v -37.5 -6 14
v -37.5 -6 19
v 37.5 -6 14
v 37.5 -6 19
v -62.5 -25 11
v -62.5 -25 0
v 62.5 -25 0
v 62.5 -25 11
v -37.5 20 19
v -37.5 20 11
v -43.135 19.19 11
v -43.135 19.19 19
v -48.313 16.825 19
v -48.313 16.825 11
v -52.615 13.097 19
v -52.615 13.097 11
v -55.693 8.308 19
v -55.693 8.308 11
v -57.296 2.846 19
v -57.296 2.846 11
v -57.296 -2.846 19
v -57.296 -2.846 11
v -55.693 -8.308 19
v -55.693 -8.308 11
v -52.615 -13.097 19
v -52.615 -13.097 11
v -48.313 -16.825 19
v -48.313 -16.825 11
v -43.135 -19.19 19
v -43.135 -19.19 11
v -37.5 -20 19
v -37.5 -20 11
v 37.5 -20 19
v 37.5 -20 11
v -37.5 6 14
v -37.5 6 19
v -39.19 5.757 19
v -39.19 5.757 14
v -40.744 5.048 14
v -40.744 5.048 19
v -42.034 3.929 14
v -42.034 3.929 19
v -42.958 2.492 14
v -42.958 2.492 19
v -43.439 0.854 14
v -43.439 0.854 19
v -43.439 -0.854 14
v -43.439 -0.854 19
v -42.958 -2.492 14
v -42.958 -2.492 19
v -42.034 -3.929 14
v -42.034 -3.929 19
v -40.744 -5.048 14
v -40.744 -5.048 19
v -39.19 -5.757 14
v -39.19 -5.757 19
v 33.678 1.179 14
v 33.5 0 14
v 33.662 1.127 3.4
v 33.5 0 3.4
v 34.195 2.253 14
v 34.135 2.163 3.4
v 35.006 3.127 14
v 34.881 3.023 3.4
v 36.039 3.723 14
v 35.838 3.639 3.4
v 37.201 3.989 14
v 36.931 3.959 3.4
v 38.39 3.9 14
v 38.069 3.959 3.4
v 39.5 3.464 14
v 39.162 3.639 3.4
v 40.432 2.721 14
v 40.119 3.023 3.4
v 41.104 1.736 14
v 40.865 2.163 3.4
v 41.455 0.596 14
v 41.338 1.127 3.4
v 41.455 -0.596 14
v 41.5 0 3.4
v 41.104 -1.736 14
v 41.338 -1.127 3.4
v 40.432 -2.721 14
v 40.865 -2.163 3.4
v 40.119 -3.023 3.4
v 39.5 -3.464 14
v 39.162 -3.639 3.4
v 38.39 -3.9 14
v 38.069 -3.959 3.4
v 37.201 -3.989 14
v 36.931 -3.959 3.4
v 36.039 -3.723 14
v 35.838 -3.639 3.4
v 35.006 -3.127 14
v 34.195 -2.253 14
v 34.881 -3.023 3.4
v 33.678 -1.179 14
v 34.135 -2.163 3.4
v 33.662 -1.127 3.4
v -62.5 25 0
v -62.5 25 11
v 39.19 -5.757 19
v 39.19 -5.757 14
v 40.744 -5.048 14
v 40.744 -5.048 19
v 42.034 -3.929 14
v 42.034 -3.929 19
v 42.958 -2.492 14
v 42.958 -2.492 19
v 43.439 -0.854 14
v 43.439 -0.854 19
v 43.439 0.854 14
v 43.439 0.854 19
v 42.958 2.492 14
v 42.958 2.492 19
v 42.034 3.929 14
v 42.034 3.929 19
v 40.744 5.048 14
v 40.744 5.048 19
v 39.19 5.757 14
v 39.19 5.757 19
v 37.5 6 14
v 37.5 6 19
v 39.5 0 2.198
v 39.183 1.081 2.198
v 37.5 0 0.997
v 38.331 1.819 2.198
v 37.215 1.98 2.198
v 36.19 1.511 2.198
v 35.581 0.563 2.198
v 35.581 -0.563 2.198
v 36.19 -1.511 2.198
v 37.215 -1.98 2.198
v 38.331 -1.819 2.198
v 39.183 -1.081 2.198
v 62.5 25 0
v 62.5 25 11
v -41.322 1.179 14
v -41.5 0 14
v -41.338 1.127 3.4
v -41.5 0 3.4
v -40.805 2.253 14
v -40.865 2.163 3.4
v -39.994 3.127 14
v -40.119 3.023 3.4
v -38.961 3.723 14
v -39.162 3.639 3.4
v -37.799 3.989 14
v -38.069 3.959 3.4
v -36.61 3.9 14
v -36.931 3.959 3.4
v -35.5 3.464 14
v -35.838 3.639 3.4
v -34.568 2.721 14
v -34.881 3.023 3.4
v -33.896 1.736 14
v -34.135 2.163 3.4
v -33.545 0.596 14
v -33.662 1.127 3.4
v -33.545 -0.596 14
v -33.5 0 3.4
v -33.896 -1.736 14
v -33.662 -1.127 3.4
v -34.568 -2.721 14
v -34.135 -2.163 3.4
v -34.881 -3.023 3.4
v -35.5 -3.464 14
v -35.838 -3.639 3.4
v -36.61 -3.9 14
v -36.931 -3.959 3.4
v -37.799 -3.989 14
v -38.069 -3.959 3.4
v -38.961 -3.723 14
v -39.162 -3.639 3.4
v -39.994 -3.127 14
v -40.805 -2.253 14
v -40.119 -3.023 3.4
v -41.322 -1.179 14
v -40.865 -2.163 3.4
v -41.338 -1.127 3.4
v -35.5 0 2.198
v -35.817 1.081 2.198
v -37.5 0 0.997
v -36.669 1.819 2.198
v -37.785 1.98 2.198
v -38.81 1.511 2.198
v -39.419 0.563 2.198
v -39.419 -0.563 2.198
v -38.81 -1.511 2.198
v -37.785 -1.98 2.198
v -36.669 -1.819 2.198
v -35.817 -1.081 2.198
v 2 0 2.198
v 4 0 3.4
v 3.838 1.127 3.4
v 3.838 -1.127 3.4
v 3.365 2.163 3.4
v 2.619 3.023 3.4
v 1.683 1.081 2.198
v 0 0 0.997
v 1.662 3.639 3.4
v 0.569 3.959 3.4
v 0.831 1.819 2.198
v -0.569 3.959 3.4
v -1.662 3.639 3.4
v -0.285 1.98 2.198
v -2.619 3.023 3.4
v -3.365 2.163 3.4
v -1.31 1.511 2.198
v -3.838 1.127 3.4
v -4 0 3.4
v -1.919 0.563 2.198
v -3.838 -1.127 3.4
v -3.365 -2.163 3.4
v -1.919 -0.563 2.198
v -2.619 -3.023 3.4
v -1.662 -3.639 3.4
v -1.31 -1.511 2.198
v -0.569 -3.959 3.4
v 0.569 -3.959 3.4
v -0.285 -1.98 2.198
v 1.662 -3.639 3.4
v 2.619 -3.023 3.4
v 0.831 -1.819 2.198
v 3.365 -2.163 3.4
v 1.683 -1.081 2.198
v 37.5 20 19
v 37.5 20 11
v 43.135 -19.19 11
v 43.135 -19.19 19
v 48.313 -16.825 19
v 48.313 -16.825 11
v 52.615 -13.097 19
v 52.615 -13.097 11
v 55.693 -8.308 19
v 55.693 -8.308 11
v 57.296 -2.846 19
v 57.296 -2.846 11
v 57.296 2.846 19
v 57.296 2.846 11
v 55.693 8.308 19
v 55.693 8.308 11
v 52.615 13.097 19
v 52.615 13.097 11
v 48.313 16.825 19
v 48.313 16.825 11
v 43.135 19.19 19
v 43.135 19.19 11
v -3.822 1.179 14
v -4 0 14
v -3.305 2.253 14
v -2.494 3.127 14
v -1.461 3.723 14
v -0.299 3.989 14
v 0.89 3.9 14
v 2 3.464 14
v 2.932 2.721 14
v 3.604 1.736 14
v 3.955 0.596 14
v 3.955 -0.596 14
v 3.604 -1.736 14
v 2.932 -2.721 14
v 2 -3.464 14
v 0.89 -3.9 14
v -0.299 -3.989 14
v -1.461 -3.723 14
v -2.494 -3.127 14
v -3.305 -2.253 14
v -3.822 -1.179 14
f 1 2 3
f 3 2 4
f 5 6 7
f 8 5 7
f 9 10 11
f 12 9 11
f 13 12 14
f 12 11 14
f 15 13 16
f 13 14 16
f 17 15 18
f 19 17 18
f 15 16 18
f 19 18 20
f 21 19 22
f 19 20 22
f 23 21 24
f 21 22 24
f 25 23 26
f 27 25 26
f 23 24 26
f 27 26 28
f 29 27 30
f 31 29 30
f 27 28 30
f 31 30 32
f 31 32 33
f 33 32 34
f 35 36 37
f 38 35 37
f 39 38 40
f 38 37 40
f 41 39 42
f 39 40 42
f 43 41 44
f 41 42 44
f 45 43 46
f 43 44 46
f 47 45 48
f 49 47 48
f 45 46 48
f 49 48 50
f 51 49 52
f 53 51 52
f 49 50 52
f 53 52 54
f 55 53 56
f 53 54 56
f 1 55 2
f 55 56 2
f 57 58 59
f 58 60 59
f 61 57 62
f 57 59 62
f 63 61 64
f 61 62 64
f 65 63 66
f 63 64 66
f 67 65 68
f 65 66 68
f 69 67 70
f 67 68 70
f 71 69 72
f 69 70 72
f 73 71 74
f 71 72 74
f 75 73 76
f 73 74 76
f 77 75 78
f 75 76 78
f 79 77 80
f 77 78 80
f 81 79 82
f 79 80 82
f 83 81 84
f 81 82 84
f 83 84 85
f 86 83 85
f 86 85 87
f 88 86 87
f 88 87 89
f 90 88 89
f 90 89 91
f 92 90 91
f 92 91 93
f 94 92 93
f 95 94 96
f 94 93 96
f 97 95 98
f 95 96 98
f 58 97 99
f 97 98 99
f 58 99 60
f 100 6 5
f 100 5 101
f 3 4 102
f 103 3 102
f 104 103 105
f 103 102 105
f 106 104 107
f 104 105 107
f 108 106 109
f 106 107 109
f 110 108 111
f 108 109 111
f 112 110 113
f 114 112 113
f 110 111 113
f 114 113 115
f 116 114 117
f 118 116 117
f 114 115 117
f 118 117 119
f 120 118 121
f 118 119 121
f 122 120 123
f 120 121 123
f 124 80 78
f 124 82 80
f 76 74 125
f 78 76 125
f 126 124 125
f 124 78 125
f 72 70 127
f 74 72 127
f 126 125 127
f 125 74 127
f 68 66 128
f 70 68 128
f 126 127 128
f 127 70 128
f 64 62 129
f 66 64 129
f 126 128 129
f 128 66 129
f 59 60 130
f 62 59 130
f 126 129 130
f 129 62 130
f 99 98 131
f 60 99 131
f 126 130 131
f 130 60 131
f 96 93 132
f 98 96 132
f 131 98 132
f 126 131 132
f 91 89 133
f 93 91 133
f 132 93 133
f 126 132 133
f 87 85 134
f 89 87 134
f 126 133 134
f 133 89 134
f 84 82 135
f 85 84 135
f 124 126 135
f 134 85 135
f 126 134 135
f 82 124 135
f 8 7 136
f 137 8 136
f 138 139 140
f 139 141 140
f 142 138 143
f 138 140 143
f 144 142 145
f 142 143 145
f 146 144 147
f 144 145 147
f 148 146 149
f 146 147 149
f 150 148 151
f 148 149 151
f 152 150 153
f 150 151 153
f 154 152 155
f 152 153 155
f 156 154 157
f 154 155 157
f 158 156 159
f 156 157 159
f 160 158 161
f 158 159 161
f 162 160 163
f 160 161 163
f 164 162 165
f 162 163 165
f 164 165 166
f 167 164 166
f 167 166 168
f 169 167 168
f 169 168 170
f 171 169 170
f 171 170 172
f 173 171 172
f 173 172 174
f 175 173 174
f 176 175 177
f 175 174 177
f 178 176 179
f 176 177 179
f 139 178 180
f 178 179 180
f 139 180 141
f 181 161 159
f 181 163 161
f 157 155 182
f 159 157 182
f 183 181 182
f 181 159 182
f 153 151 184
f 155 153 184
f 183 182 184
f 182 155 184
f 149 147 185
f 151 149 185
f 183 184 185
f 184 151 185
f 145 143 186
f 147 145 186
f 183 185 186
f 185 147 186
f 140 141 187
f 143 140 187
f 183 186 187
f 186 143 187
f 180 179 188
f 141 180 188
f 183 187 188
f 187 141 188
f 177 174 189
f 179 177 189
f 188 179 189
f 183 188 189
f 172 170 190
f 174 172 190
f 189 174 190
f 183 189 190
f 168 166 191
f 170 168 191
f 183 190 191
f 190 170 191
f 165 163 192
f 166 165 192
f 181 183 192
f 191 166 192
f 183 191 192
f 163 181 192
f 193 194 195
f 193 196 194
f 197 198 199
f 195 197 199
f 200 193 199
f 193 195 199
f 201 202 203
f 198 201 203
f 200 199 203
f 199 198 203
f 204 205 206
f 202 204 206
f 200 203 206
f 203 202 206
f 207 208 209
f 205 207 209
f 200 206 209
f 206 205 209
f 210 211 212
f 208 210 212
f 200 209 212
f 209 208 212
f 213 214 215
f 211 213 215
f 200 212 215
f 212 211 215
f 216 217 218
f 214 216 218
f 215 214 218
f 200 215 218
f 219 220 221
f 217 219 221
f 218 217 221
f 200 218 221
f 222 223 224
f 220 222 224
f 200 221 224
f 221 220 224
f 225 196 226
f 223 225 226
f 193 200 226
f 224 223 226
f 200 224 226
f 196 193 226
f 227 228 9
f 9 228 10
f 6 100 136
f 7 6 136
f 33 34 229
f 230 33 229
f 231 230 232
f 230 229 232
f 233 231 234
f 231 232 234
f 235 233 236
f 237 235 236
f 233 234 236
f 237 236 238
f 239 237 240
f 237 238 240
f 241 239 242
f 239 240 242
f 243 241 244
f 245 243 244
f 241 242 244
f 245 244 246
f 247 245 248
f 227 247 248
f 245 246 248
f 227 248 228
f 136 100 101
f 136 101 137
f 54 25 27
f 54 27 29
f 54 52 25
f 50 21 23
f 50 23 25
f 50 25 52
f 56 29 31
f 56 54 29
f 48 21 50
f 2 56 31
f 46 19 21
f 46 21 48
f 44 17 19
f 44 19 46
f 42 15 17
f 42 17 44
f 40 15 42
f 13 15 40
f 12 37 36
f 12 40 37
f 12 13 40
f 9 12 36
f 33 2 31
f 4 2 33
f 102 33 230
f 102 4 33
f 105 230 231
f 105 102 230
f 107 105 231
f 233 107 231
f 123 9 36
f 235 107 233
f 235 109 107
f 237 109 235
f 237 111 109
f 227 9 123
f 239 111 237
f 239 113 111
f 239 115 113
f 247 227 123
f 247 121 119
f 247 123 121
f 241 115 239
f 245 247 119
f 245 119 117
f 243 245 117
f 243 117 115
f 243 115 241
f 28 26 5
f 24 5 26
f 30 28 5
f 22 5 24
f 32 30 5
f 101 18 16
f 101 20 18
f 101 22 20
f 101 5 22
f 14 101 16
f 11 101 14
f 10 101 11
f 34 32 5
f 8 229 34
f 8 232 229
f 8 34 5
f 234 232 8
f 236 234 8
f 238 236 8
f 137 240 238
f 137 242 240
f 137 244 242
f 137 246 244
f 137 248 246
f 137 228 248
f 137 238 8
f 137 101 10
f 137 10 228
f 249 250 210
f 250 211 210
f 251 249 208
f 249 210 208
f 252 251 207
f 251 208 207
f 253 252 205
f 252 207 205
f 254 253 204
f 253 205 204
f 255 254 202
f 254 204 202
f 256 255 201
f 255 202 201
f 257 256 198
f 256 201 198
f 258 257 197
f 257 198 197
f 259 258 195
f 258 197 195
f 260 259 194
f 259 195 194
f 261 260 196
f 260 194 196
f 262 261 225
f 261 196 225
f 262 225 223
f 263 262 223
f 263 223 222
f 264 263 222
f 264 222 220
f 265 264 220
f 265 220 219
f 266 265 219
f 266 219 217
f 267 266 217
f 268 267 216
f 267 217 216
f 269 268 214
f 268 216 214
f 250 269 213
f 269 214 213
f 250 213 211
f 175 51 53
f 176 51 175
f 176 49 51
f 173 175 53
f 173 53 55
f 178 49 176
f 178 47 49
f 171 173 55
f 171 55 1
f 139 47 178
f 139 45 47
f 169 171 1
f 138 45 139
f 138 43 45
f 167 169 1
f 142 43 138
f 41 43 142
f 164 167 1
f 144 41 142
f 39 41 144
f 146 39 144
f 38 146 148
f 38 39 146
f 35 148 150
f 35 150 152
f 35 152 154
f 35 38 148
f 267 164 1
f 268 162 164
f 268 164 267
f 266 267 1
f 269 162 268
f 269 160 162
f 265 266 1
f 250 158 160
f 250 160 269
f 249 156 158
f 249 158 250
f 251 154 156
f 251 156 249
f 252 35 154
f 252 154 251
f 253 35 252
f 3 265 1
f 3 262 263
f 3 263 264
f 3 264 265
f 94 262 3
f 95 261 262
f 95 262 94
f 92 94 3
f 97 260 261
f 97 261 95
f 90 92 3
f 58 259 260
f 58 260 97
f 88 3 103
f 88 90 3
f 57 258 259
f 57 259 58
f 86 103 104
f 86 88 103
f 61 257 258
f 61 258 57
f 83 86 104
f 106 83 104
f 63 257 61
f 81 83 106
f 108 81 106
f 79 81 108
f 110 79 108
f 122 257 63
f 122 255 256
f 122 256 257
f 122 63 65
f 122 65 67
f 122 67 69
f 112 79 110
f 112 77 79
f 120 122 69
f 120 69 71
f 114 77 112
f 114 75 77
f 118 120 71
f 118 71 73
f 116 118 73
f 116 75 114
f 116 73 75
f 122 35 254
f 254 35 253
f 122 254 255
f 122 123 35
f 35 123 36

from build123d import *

# Parameters (mm, degrees)
F0_W     = 125
F0_H     = 50
F1_DEPTH = 11
F3_DEPTH = 8
F5_DEPTH = 5
F7_D     = 8
F7_DEPTH = 10.6
F7_TIP   = 2.4034424761
F9_D     = 8
F9_DEPTH = 10.6
F9_TIP   = 2.4034424761


with BuildPart() as f1:
    # F0 (on Top) → F1 (new body)
    with BuildSketch(Plane.XY):
        Rectangle(F0_W, F0_H)
    extrude(amount=F1_DEPTH)

    # F2 (on face) → F3 (join)
    with BuildSketch(Plane.XY.offset(11)):
        with BuildLine():
            ThreePointArc((37.5, -20), (57.5, 0), (37.5, 20))
            Line((37.5, 20), (-37.5, 20))
            ThreePointArc((-37.5, 20), (-57.5, 0), (-37.5, -20))
            Line((-37.5, -20), (37.5, -20))
        make_face()
    extrude(amount=F3_DEPTH)

    # F4 (on face) → F5 (cut)
    with BuildSketch(Plane.XY.offset(19)):
        with BuildLine():
            ThreePointArc((37.5, -6), (43.5, 0), (37.5, 6))
            Line((37.5, 6), (-37.5, 6))
            ThreePointArc((-37.5, 6), (-43.5, 0), (-37.5, -6))
            Line((-37.5, -6), (37.5, -6))
        make_face()
    extrude(amount=-F5_DEPTH, mode=Mode.SUBTRACT)

    # F7
    with Locations(Plane.XY.offset(14)):
        with Locations((0, 0)):
            Hole(F7_D / 2, depth=F7_DEPTH)
            with Locations((0, 0, -(F7_DEPTH + F7_TIP / 2))):  # 118° drill point
                Cone(0, F7_D / 2, F7_TIP, mode=Mode.SUBTRACT)

    # F9
    with Locations(Plane.XY.offset(14)):
        with Locations((-37.5, 0), (37.5, 0)):
            Hole(F9_D / 2, depth=F9_DEPTH)
            with Locations((0, 0, -(F9_DEPTH + F9_TIP / 2))):  # 118° drill point
                Cone(0, F9_D / 2, F9_TIP, mode=Mode.SUBTRACT)


solid = f1.part
